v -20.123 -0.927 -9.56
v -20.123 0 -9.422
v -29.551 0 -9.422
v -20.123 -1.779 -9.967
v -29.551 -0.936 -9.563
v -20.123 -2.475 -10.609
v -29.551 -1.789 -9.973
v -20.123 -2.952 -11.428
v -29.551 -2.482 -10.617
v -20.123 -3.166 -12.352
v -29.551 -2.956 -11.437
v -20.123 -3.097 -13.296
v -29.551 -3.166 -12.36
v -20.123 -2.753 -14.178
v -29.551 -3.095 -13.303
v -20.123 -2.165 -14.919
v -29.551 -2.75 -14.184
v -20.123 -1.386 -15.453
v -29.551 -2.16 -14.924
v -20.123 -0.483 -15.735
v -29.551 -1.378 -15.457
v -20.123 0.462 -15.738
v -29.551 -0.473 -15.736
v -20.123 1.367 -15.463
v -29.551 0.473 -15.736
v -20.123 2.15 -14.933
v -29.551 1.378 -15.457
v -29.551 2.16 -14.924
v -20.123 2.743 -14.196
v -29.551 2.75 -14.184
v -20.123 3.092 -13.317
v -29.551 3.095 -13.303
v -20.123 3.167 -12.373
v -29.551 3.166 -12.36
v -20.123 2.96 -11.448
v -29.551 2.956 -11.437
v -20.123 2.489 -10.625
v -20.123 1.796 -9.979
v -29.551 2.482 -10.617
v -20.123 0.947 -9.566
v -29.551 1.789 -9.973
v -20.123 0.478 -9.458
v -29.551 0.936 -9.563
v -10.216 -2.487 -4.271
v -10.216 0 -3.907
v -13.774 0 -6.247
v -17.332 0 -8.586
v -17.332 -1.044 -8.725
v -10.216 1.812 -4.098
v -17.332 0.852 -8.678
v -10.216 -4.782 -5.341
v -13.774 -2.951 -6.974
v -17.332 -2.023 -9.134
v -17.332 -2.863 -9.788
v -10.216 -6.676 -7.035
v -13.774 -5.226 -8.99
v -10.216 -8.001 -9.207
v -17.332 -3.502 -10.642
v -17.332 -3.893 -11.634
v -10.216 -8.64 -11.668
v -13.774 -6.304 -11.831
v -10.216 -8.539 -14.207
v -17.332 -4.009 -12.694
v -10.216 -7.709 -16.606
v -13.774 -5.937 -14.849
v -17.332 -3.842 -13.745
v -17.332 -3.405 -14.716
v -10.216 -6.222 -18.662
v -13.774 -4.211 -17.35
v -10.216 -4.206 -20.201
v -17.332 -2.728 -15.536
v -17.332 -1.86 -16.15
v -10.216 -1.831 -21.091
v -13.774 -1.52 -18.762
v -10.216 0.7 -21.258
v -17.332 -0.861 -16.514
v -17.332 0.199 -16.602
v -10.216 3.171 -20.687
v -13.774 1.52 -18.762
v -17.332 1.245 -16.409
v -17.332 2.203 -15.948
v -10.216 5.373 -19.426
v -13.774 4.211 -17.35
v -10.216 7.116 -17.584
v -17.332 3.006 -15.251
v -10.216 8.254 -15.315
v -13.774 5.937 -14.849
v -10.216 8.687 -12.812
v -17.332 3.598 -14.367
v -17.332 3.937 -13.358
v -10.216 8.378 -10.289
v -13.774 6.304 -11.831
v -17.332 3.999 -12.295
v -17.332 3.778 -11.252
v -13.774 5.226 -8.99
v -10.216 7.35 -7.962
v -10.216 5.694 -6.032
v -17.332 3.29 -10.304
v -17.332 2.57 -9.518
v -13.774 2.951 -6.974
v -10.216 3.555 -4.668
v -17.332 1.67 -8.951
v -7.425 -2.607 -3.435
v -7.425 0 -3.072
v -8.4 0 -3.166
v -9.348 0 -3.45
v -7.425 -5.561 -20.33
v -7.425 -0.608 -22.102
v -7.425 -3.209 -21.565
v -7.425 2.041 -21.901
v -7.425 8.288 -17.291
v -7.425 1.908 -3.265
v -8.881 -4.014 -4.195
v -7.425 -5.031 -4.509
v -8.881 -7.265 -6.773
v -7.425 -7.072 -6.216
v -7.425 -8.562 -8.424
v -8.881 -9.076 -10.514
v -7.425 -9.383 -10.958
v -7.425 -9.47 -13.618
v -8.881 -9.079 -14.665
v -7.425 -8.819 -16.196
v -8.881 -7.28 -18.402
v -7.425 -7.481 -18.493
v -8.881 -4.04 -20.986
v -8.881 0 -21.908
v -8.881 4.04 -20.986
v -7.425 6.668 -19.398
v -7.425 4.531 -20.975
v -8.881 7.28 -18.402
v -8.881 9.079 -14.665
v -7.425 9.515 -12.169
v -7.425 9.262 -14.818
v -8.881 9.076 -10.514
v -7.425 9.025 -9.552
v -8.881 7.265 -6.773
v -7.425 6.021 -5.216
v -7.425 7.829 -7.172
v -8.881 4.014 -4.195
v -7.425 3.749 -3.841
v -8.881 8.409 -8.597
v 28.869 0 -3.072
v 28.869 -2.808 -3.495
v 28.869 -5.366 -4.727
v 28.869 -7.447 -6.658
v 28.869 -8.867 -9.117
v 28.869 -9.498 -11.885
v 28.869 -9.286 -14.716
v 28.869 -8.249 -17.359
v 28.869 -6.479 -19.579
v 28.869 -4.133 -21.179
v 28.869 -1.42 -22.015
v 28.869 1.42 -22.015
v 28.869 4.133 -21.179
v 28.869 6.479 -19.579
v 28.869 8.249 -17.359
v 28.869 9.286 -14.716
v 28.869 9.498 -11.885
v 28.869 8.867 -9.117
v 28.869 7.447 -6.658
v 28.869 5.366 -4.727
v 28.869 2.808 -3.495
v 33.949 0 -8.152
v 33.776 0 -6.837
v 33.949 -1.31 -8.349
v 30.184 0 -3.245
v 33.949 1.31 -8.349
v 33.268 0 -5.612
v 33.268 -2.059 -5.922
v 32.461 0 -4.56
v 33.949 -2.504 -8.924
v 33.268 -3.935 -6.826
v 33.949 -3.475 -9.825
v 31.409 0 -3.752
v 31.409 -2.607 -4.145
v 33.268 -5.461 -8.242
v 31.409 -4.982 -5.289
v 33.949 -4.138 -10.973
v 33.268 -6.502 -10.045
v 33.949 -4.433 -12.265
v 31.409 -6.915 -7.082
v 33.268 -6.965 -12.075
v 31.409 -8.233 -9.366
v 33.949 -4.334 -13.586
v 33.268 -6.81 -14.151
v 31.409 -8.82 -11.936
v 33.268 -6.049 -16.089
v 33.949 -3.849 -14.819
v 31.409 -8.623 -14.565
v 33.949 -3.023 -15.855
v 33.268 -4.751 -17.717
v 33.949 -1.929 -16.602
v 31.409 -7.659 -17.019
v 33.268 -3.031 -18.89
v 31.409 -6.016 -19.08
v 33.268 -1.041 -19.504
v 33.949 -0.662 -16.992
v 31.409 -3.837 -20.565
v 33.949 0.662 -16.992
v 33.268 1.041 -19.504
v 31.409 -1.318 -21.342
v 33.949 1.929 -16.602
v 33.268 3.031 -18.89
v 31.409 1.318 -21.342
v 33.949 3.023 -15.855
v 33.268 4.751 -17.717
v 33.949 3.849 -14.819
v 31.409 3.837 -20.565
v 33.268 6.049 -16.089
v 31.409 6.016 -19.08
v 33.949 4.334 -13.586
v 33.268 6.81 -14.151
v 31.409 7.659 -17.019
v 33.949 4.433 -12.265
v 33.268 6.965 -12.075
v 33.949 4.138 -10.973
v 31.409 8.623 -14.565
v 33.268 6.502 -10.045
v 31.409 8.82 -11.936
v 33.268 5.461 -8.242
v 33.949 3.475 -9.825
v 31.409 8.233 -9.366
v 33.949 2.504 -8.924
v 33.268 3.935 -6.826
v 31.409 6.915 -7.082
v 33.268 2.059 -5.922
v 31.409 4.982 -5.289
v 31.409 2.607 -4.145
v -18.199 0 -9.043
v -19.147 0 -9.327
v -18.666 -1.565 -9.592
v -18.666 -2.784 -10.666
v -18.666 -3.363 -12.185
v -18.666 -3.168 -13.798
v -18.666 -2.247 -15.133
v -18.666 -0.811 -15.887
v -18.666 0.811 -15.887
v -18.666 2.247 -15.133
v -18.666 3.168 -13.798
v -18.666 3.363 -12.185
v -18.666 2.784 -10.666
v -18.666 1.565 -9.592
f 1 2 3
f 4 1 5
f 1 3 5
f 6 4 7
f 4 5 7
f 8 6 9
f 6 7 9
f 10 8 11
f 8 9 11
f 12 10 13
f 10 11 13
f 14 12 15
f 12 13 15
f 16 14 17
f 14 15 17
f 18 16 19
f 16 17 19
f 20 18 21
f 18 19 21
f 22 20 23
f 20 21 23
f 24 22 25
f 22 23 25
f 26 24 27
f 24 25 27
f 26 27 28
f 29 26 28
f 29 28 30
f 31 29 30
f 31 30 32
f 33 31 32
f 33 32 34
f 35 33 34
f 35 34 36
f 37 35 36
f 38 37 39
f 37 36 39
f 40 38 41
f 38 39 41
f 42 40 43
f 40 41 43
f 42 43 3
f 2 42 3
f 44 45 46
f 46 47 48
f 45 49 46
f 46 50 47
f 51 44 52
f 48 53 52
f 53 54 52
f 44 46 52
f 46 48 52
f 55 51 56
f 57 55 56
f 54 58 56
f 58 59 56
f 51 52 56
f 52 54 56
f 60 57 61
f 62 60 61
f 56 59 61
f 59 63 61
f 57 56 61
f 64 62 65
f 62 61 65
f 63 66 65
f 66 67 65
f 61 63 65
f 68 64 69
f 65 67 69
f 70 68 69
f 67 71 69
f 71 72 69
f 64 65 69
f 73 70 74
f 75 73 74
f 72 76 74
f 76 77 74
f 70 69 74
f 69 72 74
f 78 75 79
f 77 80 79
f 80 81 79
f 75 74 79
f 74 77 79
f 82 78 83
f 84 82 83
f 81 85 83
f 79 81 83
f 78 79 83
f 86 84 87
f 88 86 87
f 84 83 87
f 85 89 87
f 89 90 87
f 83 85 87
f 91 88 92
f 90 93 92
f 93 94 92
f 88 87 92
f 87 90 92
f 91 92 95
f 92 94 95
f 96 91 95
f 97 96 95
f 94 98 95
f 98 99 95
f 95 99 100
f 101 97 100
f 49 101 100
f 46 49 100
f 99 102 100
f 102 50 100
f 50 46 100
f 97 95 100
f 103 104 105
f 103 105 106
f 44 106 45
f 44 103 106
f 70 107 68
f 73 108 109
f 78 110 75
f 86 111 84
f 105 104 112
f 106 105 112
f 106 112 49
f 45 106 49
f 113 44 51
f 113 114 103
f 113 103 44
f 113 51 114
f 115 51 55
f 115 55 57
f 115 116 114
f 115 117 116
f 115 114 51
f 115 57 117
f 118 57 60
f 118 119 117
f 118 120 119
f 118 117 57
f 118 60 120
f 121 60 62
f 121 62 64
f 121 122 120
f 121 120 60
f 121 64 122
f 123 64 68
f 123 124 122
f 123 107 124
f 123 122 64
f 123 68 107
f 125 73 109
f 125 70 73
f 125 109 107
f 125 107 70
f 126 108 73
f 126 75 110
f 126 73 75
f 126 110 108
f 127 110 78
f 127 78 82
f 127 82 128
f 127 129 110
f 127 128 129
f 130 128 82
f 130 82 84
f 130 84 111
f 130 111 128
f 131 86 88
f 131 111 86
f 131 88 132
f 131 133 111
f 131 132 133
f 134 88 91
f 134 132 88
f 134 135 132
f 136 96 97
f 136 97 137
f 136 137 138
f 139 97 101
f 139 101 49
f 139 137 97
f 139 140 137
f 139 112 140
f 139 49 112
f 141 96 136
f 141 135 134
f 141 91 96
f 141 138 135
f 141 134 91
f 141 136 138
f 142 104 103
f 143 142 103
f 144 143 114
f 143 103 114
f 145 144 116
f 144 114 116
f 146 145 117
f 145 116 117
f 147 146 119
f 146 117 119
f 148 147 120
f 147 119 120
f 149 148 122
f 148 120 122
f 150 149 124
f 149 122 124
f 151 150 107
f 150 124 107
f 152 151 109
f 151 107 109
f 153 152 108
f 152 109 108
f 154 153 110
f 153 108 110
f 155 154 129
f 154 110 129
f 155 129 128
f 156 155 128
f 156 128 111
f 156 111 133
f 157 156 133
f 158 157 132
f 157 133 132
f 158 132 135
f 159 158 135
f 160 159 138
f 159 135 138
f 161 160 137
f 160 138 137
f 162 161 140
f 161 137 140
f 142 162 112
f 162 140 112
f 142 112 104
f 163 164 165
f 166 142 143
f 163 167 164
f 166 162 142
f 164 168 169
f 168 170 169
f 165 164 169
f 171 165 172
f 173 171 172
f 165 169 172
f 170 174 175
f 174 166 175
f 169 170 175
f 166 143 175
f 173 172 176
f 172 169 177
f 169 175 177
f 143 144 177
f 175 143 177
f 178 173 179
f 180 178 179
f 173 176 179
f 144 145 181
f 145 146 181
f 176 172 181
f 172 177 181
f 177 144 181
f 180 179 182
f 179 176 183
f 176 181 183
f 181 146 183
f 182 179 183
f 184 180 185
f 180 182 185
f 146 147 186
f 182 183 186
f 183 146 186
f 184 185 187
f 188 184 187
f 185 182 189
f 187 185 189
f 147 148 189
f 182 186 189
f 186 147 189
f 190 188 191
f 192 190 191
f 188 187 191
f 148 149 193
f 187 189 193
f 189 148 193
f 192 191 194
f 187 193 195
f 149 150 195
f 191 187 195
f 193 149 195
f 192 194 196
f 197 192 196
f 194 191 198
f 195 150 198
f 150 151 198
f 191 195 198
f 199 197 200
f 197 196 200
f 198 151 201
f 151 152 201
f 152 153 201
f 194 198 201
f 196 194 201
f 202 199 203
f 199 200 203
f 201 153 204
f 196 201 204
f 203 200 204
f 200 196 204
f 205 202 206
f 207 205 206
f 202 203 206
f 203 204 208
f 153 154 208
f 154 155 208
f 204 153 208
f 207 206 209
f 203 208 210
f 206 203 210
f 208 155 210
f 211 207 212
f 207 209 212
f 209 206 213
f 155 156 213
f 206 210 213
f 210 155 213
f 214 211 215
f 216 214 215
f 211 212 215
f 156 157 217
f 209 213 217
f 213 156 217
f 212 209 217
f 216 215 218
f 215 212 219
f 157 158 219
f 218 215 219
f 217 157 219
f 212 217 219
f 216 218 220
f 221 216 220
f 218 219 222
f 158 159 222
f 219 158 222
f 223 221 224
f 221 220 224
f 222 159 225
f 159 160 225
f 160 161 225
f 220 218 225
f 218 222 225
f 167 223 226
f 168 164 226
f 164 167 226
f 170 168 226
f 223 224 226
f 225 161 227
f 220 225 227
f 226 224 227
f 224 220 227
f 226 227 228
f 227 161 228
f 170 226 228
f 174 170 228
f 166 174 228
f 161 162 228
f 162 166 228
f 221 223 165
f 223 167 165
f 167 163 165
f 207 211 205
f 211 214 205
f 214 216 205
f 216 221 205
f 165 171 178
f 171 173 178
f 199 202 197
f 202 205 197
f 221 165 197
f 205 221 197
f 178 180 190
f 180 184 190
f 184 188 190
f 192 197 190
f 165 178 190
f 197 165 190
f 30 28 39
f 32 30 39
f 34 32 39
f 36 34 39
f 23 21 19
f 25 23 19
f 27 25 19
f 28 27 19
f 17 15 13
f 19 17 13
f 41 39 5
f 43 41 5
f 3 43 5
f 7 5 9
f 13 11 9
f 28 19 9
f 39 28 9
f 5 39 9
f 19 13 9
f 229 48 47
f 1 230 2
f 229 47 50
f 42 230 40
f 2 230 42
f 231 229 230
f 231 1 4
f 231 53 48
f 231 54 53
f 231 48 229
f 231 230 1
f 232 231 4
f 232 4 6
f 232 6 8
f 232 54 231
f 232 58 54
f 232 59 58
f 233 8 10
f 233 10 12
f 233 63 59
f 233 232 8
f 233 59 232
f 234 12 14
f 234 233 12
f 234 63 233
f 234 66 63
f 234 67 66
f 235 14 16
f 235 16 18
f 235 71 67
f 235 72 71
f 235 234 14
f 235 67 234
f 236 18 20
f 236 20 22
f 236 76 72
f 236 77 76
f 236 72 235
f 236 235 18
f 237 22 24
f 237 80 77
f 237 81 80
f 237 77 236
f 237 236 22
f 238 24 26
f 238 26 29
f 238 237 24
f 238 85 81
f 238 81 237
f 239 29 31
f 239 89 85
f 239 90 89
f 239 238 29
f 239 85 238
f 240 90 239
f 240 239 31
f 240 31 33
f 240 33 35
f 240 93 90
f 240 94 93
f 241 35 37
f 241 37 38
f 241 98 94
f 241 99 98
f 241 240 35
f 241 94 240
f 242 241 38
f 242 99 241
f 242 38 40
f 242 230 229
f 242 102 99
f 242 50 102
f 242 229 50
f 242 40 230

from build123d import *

# Parameters (mm, degrees)
F2_R = 5.08
F3_R = 5.08


with BuildPart() as f1:
    # F0 (on Front) → F1 (revolve)
    with BuildSketch(Plane.XZ):
        Polygon((-18.6021607369, -9.4218043774), (-29.5509118587, -9.4218043774), (-29.5509118587, -12.5968043774), (33.9490881413, -12.5968043774), (33.9490881413, -3.0718043774), (-8.9451875538, -3.0718043774), align=None)
    revolve(axis=Axis((2.1990881413, 0, -12.5968043774), (1, 0, 0)))

    # F2
    f2_edges = [f1.edges().sort_by_distance(p)[0] for p in [
        (33.949088, 0, -22.121804),
    ]]
    fillet(f2_edges, radius=F2_R)

    # F3
    f3_edges = [f1.edges().sort_by_distance(p)[0] for p in [
        (-8.945188, 0, -22.121804),
        (-18.602161, 0, -15.771804),
        (-13.773674, 0, -6.246804),
    ]]
    fillet(f3_edges, radius=F3_R)


solid = f1.part
